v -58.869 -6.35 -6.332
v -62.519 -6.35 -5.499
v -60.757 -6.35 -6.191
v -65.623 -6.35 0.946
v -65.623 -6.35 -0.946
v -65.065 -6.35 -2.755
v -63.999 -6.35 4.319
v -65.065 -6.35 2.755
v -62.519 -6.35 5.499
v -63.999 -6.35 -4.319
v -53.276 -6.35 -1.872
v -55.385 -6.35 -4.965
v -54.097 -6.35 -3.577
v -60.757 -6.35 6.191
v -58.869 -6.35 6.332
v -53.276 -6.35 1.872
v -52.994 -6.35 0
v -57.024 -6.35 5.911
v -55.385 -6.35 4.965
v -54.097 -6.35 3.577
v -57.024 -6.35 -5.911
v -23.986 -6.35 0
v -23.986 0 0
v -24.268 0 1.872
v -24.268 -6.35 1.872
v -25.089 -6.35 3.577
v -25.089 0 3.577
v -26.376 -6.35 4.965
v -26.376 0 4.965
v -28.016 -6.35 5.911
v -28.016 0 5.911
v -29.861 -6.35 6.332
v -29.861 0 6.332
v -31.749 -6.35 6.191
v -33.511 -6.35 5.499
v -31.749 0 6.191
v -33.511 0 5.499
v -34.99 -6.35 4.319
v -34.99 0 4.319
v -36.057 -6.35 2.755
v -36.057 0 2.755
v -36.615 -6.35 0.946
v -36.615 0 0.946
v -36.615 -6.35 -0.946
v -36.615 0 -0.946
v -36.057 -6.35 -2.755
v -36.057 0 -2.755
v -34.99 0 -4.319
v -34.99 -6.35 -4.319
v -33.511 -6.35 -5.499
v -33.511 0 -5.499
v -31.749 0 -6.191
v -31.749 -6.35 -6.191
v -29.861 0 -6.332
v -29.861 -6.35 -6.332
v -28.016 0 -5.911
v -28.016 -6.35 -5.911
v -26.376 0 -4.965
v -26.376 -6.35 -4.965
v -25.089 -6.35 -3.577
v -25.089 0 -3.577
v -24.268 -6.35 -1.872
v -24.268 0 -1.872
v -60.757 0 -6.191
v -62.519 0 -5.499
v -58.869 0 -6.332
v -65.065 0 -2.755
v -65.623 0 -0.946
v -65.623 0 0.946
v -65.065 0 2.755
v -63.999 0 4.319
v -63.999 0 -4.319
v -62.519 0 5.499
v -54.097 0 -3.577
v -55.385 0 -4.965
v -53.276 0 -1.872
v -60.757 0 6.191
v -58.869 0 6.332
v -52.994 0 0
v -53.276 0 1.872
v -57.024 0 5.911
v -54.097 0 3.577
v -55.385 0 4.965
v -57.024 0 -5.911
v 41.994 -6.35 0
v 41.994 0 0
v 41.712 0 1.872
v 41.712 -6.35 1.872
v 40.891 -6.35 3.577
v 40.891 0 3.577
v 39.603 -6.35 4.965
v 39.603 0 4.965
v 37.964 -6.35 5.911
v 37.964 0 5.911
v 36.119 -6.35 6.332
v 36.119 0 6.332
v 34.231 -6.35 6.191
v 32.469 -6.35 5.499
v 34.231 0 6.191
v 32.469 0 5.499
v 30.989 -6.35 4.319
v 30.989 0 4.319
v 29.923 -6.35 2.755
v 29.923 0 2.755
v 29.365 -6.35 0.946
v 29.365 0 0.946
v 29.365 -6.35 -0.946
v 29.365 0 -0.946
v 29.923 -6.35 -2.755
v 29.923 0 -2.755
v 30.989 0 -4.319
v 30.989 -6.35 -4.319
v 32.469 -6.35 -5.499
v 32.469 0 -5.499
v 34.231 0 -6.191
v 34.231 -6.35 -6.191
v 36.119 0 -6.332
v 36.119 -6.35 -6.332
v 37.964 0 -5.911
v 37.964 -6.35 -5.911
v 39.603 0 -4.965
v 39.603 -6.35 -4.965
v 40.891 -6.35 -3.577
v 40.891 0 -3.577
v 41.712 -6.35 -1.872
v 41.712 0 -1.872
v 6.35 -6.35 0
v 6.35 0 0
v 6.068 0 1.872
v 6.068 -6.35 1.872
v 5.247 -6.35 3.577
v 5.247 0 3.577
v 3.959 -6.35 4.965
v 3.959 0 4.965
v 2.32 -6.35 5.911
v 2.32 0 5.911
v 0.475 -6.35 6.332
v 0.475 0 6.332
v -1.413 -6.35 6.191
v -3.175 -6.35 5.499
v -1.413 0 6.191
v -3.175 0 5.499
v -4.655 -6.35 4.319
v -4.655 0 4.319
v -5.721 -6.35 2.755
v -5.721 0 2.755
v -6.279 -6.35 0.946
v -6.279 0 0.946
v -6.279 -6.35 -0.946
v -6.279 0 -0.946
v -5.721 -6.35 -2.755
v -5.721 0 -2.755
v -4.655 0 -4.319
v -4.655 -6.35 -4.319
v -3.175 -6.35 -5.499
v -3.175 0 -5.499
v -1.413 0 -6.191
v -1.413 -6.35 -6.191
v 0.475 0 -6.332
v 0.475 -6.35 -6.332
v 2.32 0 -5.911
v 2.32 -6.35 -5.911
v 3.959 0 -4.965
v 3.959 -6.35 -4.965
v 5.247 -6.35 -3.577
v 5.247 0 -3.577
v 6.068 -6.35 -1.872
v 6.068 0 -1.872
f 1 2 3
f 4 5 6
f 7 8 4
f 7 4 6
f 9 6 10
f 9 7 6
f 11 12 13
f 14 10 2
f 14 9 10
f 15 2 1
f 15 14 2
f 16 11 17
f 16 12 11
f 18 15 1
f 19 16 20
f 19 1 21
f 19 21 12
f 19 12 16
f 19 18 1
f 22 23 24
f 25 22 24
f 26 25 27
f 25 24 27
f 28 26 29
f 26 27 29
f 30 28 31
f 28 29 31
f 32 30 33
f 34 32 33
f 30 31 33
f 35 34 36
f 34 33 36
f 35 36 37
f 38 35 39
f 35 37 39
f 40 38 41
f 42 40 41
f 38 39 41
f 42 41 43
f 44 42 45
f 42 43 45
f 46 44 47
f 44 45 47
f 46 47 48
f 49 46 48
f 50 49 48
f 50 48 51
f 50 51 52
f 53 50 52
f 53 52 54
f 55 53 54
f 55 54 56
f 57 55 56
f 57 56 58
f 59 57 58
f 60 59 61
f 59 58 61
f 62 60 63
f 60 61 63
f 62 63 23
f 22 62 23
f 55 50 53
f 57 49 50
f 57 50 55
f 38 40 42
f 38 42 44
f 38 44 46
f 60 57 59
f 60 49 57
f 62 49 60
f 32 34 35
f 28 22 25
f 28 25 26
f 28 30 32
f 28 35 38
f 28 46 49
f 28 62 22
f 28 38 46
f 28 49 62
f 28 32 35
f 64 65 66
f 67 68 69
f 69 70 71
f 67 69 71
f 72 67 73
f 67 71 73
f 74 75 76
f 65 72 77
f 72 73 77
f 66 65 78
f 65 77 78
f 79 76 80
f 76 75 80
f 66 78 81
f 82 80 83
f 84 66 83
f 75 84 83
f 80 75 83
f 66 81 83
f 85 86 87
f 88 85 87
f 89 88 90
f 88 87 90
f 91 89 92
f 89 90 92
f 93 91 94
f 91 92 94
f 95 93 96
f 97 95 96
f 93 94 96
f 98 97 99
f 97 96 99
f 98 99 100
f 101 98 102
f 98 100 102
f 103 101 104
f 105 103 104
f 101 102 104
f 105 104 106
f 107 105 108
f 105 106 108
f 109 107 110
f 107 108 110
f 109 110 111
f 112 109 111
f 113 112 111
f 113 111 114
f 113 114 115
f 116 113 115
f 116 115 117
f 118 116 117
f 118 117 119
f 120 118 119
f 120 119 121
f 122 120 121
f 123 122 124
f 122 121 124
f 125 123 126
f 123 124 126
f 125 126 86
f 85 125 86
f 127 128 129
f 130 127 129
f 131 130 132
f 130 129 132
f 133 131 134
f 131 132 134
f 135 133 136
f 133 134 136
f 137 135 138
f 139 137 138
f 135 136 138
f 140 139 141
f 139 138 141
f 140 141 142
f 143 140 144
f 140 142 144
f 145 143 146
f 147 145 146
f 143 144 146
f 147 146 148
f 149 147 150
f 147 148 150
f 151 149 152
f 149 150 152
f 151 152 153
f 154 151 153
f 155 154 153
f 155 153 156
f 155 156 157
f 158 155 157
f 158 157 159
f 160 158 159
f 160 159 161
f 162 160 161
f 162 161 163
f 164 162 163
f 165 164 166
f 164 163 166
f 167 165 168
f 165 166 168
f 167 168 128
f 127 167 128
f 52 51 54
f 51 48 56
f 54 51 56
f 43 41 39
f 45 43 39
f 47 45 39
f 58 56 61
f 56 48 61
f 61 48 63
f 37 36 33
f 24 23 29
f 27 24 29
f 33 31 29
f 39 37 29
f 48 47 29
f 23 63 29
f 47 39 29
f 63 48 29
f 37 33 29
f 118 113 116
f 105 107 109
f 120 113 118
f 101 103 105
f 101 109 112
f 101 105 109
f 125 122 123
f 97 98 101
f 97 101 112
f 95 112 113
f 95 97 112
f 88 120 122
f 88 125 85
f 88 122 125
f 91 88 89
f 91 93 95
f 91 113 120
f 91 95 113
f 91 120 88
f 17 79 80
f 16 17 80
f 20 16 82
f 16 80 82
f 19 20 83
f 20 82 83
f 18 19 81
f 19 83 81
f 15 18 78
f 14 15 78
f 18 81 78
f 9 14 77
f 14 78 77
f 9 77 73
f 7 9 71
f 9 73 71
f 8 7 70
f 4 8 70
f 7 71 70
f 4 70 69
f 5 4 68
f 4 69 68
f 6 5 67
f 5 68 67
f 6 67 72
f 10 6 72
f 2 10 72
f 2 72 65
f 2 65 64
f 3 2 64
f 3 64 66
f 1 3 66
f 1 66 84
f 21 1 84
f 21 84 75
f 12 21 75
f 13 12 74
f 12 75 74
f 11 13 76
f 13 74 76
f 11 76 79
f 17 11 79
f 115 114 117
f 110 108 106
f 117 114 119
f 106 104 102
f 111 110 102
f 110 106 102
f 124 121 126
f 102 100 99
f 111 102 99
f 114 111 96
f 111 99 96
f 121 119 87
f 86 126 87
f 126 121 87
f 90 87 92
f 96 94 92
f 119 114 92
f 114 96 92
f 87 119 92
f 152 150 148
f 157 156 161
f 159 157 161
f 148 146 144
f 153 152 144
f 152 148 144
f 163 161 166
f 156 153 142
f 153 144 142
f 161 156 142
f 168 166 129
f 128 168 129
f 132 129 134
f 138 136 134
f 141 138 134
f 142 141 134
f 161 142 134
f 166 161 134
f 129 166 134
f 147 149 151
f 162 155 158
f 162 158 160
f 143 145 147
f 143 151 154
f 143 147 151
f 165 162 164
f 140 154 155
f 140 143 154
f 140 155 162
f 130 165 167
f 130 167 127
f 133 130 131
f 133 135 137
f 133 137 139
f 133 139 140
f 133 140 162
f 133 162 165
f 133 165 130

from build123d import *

# Parameters (mm, degrees)
F0_R     = 6.35
F1_DEPTH = 6.35


with BuildPart() as f1:
    # F0 (on Front) → F1 (new body)
    with BuildSketch(Plane.XZ):
        Circle(F0_R)
        with Locations((35.644267, 0)):
            Circle(F0_R)
        with Locations((-30.335546, 0)):
            Circle(F0_R)
        with Locations((-59.343912, 0)):
            Circle(F0_R)
    extrude(amount=F1_DEPTH)


solid = f1.part
